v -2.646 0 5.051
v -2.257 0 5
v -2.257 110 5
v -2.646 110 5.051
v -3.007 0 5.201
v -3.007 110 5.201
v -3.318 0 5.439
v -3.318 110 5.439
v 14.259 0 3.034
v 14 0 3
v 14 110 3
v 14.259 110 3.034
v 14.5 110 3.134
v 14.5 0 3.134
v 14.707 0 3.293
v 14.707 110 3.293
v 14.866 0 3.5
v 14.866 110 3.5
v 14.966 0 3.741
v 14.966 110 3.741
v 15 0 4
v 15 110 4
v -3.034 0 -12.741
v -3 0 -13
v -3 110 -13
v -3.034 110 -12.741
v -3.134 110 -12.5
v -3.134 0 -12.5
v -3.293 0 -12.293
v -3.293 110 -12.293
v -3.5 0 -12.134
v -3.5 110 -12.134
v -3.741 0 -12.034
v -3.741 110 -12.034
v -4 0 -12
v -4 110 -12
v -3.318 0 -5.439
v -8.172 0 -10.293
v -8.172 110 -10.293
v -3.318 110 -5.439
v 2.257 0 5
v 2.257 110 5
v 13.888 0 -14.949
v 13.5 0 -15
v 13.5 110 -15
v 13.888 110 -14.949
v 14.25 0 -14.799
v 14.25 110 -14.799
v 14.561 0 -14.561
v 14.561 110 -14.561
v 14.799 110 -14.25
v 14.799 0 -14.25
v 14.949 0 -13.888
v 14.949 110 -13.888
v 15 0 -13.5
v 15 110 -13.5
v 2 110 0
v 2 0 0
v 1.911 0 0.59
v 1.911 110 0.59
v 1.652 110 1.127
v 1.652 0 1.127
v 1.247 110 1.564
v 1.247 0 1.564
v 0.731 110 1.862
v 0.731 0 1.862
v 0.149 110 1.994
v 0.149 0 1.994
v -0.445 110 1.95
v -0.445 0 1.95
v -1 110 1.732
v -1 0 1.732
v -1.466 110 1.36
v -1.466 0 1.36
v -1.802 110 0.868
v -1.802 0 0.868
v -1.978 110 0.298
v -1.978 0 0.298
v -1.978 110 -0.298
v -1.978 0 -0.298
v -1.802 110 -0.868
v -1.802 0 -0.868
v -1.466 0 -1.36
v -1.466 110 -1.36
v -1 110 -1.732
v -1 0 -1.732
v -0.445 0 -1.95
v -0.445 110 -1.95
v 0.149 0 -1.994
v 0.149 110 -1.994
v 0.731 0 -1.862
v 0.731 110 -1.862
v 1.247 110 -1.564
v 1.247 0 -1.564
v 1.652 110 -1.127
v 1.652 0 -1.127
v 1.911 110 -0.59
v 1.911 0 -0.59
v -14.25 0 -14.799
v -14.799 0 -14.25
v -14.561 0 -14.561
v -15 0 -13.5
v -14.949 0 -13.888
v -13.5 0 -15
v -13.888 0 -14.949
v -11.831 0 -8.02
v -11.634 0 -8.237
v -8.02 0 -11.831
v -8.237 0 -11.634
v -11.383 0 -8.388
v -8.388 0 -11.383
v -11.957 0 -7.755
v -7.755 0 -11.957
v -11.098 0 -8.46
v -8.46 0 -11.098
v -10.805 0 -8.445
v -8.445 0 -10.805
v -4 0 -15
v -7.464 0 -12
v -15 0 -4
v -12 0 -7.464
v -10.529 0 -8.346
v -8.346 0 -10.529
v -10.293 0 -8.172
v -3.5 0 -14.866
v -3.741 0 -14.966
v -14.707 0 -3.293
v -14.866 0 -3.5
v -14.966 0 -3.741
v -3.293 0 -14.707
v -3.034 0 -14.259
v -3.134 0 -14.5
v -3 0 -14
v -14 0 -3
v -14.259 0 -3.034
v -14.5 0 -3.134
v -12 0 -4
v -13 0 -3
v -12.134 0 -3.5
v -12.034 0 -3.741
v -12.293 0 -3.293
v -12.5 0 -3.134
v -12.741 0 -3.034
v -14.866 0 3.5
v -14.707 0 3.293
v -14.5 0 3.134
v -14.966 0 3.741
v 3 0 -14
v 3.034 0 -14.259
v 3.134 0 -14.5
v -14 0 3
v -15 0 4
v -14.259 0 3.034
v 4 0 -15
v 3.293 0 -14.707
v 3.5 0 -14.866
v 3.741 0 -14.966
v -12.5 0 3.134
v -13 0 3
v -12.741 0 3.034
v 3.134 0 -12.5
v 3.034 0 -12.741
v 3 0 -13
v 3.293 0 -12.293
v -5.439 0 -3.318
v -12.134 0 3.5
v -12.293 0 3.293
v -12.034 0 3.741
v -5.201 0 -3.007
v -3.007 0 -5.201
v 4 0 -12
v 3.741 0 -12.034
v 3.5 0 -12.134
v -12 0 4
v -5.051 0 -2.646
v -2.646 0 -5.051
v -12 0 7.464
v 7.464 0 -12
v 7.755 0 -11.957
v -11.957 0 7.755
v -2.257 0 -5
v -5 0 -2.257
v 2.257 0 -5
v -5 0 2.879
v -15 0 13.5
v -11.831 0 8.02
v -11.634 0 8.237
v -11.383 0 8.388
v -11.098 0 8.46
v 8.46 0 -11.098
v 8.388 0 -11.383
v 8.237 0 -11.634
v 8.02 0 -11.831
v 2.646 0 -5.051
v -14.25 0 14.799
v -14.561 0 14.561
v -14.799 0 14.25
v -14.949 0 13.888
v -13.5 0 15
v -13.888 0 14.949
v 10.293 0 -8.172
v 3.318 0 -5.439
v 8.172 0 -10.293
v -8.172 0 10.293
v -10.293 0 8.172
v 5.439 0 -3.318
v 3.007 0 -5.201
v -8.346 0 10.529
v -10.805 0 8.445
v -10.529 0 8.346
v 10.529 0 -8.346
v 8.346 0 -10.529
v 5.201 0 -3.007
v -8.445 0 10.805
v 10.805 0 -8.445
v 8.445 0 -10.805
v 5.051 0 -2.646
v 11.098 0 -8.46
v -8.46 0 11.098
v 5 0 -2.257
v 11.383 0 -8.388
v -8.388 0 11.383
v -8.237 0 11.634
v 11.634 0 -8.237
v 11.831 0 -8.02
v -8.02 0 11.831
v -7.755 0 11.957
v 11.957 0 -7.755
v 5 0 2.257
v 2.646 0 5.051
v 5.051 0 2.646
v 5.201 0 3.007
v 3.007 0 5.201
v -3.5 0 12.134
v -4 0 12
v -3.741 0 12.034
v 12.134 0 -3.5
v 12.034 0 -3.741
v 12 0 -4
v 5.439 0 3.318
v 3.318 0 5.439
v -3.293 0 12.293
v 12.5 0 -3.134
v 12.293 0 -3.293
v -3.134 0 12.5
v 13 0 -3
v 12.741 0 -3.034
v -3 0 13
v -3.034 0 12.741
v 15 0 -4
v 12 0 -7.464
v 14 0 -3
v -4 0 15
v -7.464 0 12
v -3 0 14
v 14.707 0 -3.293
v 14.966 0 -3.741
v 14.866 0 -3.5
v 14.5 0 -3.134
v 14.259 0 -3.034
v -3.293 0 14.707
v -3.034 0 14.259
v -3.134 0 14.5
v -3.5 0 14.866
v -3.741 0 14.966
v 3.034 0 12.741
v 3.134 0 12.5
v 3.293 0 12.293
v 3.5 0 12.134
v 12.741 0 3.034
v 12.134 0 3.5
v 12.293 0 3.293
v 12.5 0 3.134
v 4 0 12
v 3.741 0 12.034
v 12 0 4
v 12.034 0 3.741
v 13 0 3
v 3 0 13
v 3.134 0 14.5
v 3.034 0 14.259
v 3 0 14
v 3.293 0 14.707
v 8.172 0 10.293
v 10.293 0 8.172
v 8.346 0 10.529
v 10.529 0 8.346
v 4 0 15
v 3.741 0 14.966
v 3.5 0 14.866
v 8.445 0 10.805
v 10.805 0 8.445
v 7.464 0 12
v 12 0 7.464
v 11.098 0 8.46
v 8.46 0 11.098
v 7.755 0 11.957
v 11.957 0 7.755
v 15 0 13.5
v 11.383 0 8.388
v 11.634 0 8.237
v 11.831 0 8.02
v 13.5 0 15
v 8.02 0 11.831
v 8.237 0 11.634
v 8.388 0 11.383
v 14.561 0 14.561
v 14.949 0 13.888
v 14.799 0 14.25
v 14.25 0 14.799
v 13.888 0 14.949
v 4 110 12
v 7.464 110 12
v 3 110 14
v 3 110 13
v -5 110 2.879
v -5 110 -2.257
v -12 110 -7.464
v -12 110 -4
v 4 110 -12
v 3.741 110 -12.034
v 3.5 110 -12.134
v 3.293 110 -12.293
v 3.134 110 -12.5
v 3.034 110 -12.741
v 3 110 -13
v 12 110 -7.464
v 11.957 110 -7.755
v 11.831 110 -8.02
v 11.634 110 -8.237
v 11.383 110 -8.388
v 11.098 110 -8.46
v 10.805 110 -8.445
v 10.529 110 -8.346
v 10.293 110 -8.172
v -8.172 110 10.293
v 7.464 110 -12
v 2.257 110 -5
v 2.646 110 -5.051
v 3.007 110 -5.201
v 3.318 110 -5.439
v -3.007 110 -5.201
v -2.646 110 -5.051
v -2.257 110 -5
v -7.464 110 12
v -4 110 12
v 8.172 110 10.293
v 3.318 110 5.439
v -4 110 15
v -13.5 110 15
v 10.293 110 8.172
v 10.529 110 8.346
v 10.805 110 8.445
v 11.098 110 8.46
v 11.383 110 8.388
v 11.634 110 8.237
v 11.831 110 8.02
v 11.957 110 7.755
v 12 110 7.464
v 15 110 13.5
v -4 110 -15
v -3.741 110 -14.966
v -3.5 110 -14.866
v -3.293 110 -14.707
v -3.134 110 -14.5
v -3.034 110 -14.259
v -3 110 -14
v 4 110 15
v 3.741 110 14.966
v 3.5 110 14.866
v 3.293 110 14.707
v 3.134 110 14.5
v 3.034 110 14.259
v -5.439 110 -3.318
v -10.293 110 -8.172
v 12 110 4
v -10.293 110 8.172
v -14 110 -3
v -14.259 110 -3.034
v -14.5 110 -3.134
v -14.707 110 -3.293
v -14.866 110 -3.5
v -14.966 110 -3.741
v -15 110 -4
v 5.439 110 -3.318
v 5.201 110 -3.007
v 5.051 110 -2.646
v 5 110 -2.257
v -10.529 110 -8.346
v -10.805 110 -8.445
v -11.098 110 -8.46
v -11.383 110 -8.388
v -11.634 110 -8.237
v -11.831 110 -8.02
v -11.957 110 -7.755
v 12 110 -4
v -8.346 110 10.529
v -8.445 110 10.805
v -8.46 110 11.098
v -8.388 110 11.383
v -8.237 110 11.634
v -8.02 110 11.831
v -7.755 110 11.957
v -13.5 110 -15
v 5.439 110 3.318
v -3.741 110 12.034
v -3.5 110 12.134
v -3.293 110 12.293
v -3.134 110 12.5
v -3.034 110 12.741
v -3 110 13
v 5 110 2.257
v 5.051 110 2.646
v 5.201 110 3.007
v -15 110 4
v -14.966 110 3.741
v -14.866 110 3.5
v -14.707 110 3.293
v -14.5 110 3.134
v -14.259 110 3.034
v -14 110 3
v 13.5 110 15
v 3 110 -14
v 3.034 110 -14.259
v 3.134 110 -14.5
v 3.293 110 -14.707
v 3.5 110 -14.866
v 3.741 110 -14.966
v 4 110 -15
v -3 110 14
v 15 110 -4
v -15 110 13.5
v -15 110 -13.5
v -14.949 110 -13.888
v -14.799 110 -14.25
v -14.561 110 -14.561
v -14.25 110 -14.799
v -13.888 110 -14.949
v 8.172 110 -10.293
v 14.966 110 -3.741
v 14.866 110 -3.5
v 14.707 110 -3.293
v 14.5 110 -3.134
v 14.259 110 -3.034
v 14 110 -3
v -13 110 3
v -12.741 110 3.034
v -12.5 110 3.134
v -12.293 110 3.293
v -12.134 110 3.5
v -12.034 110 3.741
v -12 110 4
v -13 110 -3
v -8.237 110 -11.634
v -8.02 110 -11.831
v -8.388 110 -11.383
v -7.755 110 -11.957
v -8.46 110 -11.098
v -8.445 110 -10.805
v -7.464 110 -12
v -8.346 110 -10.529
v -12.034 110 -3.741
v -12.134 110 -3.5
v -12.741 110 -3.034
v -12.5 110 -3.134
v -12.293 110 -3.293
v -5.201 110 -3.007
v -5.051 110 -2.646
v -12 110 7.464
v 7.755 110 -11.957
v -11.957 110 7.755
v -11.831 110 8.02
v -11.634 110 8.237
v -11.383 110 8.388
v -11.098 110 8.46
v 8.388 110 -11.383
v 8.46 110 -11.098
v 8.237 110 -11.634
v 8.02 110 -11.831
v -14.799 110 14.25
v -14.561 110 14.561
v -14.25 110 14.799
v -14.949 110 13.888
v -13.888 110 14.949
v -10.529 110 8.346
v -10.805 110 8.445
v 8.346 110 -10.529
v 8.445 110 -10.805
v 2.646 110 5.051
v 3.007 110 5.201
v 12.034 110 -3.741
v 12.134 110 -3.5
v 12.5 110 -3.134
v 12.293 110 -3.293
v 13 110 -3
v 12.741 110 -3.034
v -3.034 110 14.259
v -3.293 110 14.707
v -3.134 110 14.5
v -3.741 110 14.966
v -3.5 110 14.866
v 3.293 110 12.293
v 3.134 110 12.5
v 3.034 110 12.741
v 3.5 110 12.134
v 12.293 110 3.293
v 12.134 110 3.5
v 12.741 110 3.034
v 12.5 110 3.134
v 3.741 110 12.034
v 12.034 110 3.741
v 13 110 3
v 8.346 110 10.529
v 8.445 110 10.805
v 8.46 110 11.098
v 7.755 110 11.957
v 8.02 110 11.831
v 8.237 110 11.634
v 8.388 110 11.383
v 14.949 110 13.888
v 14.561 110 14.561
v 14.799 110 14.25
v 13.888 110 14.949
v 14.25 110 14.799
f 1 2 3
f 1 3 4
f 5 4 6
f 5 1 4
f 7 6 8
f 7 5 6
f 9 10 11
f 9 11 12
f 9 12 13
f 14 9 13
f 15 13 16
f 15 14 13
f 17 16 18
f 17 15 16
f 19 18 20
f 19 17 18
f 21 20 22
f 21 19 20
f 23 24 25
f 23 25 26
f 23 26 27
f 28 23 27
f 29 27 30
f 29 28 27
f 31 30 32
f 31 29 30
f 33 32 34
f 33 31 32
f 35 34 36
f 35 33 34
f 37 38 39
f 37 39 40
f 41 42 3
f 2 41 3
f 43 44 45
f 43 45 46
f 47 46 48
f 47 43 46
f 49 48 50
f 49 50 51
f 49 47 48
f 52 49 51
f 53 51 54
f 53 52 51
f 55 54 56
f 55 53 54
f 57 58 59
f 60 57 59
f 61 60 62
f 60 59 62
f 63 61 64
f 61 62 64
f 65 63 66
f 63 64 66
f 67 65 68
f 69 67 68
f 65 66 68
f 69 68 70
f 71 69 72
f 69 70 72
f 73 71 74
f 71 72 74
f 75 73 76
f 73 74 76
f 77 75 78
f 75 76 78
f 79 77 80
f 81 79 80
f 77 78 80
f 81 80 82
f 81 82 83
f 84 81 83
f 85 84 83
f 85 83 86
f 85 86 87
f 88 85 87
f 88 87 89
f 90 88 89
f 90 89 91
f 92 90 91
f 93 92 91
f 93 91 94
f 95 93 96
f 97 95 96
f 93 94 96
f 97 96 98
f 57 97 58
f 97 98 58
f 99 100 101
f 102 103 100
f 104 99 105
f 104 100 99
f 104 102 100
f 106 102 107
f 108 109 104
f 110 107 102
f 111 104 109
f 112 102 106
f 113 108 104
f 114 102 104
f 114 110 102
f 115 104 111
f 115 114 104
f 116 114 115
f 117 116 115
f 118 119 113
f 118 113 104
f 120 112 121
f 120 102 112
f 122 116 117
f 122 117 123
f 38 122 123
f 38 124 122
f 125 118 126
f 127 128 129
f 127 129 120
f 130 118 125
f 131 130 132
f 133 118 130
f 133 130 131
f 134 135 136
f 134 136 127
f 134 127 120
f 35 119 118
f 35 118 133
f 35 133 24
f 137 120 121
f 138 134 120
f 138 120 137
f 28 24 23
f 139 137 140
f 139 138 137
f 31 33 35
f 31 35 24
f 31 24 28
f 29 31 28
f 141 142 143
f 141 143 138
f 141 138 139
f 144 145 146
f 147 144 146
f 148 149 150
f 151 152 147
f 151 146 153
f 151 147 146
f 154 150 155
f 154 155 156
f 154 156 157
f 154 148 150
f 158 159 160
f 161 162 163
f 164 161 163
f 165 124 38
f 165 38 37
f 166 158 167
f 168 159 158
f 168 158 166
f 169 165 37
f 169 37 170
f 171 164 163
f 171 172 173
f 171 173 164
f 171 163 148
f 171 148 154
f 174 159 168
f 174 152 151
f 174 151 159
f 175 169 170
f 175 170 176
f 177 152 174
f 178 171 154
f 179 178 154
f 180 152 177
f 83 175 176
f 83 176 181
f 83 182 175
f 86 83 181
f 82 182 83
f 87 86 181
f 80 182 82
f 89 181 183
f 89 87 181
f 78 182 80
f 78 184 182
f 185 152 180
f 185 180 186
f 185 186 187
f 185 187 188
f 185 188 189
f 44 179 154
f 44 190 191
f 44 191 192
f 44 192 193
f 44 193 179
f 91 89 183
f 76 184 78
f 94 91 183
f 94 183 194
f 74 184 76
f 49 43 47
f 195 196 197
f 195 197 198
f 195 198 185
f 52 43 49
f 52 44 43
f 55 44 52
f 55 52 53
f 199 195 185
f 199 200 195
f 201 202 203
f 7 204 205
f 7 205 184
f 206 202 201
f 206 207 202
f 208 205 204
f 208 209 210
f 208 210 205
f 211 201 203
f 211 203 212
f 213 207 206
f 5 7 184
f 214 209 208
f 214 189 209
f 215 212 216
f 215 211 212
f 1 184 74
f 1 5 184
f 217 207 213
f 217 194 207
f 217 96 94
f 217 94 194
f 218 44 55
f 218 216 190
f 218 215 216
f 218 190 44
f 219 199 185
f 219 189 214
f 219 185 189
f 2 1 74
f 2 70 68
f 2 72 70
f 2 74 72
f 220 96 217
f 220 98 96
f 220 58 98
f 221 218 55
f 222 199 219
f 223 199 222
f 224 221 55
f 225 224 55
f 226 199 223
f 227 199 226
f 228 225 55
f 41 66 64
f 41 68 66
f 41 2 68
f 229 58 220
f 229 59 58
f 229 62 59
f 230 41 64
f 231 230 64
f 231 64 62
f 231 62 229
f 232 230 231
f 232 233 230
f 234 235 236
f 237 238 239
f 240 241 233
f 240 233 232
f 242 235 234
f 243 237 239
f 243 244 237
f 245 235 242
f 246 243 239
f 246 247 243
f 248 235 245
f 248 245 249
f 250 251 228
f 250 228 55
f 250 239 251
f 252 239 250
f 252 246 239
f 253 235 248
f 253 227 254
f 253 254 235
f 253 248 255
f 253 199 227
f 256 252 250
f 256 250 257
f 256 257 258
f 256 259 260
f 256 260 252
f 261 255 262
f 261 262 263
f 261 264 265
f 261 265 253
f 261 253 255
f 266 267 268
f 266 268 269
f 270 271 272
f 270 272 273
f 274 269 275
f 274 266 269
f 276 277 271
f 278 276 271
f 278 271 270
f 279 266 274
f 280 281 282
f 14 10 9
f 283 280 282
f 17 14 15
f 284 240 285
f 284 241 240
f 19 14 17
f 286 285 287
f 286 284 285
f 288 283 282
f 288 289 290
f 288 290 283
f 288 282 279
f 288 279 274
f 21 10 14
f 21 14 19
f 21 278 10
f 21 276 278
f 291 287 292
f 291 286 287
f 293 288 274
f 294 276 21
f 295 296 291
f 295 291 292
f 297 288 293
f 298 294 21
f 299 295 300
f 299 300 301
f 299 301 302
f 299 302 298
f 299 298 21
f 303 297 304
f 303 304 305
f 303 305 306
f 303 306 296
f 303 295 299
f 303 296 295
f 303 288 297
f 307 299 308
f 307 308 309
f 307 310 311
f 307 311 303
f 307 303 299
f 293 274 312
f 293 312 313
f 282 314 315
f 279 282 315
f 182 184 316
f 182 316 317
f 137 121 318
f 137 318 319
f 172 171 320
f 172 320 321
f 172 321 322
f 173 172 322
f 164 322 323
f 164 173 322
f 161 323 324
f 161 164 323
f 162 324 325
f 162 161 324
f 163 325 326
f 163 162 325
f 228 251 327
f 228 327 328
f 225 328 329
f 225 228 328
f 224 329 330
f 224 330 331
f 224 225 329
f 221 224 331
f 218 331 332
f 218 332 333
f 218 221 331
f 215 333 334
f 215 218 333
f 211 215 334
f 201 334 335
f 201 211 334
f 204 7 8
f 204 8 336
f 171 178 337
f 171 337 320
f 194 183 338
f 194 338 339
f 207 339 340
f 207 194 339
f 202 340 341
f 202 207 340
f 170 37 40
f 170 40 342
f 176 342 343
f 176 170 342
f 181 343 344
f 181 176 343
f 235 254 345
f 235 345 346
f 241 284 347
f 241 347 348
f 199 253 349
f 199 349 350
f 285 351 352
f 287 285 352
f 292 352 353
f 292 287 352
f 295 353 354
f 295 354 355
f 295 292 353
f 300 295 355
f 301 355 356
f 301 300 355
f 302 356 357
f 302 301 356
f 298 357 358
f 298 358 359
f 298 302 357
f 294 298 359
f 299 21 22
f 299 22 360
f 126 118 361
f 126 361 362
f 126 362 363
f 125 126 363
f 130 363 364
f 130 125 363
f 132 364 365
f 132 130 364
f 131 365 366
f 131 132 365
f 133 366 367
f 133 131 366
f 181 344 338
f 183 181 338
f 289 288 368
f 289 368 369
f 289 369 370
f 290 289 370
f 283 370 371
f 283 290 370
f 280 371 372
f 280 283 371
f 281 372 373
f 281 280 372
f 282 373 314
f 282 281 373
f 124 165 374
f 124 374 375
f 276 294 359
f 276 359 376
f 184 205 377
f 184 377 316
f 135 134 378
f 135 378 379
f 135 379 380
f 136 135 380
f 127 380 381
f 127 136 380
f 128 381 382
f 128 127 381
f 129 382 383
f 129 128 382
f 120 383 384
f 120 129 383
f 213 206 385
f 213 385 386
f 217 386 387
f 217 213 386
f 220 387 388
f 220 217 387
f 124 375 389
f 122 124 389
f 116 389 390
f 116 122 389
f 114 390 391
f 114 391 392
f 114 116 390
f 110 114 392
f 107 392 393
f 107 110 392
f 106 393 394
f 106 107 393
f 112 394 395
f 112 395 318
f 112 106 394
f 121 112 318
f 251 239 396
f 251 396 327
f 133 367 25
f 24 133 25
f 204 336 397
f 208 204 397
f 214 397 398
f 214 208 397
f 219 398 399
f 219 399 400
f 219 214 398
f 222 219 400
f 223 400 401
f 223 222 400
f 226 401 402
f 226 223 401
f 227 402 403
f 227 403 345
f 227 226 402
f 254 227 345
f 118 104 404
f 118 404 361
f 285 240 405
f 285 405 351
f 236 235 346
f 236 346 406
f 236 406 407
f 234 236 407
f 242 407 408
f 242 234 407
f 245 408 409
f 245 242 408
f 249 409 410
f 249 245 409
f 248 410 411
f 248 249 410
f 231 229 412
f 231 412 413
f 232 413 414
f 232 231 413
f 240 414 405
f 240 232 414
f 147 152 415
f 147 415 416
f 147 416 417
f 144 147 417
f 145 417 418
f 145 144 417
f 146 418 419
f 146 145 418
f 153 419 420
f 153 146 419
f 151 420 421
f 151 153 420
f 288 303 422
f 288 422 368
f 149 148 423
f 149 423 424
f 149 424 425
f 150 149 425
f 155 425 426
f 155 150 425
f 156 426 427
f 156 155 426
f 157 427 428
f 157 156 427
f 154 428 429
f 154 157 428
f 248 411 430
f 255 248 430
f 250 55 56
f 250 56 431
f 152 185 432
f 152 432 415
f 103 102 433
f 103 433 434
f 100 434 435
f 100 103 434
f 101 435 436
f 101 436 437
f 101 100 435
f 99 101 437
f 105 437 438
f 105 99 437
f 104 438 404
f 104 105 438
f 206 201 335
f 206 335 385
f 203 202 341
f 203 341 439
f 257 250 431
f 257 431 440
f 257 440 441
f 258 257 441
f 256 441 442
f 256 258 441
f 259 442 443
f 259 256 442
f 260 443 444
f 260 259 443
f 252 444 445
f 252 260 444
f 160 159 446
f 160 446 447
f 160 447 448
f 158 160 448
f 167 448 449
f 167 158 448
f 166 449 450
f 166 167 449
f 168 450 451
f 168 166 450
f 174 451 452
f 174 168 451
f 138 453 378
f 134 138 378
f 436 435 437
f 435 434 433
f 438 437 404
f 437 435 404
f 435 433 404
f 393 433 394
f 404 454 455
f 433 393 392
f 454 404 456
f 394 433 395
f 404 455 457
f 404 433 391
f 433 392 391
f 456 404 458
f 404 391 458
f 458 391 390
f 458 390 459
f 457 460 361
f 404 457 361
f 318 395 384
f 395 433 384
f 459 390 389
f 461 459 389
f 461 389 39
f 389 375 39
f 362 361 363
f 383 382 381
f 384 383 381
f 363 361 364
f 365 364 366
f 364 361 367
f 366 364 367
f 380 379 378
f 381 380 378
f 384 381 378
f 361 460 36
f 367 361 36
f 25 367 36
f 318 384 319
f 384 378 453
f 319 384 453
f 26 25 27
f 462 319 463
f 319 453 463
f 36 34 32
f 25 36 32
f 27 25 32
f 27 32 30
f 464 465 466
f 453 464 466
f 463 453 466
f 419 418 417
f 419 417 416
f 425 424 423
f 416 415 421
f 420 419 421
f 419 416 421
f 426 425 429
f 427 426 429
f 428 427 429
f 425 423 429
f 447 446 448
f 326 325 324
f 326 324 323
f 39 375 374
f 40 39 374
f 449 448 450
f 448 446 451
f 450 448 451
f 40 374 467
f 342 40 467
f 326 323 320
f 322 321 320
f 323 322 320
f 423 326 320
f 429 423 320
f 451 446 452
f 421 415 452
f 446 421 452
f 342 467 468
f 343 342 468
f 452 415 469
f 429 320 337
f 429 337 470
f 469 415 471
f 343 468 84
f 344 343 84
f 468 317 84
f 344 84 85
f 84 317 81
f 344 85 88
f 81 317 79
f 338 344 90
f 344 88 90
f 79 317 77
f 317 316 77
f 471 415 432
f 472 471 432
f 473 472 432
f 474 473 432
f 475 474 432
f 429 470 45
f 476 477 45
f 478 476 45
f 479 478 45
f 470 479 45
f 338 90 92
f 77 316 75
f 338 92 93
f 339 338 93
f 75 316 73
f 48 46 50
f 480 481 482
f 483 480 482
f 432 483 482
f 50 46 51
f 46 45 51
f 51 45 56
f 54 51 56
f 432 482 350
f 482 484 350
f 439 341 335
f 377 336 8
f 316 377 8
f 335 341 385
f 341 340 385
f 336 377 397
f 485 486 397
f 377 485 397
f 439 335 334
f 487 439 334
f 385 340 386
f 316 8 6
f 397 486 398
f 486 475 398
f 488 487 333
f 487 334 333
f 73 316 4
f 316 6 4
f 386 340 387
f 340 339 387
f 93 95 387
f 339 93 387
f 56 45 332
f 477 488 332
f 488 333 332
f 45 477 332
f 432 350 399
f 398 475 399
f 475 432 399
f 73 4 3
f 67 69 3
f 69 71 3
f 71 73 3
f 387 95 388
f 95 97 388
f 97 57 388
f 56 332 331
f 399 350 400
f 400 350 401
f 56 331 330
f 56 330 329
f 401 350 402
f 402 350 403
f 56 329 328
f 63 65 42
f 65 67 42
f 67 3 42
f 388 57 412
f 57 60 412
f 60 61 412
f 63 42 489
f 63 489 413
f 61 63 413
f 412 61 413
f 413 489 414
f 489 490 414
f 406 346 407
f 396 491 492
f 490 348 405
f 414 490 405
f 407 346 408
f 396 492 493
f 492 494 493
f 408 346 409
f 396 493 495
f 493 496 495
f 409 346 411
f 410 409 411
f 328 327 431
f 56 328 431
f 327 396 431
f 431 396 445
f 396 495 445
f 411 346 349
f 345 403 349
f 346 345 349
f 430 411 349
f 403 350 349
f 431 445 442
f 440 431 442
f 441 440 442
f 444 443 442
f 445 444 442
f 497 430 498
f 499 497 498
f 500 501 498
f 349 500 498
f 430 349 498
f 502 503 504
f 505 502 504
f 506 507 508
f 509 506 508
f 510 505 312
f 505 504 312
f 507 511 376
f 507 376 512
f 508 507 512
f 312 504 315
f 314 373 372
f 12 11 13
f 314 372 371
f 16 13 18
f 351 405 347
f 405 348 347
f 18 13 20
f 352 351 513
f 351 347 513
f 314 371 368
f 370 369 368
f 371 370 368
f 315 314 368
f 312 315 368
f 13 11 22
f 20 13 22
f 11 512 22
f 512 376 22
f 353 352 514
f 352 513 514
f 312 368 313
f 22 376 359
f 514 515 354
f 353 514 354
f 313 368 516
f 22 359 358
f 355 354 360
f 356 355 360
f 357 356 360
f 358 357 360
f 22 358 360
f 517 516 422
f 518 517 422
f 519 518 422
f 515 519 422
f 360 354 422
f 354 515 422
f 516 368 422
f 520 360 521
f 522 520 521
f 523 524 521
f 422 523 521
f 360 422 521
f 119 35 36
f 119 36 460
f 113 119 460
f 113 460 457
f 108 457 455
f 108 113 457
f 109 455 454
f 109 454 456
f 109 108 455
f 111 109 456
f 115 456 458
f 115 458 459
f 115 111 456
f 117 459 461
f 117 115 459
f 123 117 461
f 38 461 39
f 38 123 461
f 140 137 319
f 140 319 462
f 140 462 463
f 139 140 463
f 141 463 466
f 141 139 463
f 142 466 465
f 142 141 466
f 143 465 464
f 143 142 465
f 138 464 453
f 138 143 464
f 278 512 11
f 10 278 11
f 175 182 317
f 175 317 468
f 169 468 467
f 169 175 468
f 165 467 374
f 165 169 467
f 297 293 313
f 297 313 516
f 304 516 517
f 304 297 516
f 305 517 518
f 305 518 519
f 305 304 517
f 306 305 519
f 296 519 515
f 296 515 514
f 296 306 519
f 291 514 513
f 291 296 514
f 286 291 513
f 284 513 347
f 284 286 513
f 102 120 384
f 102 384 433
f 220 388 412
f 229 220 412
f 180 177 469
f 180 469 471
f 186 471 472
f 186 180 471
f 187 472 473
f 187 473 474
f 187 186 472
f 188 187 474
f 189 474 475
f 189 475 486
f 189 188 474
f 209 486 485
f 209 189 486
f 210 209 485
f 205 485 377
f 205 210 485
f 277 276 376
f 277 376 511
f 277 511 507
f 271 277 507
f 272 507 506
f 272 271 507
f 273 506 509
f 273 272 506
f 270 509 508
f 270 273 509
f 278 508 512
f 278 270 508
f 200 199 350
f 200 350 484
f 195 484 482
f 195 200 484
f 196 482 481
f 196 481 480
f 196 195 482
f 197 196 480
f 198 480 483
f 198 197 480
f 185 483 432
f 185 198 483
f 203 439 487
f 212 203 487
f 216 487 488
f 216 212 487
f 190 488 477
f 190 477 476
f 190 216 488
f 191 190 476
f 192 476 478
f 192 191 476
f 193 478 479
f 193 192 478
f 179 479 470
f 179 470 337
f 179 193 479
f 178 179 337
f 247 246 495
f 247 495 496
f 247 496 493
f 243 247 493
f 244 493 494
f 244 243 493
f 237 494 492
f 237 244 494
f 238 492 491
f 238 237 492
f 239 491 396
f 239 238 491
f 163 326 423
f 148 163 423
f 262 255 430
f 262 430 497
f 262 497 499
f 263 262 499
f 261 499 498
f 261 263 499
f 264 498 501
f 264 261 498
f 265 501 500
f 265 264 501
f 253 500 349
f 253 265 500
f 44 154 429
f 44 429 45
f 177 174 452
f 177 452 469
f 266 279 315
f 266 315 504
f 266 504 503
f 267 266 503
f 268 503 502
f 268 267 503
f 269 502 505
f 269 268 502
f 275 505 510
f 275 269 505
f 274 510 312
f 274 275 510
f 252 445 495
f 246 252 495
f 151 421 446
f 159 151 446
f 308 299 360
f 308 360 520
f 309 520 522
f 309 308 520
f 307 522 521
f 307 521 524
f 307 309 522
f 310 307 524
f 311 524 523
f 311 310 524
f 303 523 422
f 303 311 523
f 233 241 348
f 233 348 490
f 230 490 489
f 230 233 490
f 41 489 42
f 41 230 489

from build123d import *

# Parameters (mm, degrees)
F0_R     = 2
F1_DEPTH = 110


with BuildPart() as f1:
    # F0 (on Front) → F1 (new body)
    with BuildSketch(Plane.XZ):
        with BuildLine():
            ThreePointArc((15, 13.5), (14.56066, 14.56066), (13.5, 15))
            Line((13.5, 15), (4, 15))
            ThreePointArc((4, 15), (3.292893, 14.707107), (3, 14))
            Line((3, 14), (3, 13))
            ThreePointArc((3, 13), (3.292893, 12.292893), (4, 12))
            Line((4, 12), (7.464466, 12))
            ThreePointArc((7.464466, 12), (8.388346, 11.382683), (8.171573, 10.292893))
            Line((8.171573, 10.292893), (3.318019, 5.43934))
            ThreePointArc((3.318019, 5.43934), (2.831384, 5.114181), (2.257359, 5))
            Line((2.257359, 5), (-2.257359, 5))
            ThreePointArc((-2.257359, 5), (-2.831384, 5.114181), (-3.318019, 5.43934))
            Line((-3.318019, 5.43934), (-8.171573, 10.292893))
            ThreePointArc((-8.171573, 10.292893), (-8.388346, 11.382683), (-7.464466, 12))
            Line((-7.464466, 12), (-4, 12))
            ThreePointArc((-4, 12), (-3.292893, 12.292893), (-3, 13))
            Line((-3, 13), (-3, 14))
            ThreePointArc((-3, 14), (-3.292893, 14.707107), (-4, 15))
            Line((-4, 15), (-13.5, 15))
            ThreePointArc((-13.5, 15), (-14.56066, 14.56066), (-15, 13.5))
            Line((-15, 13.5), (-15, 4))
            ThreePointArc((-15, 4), (-14.707107, 3.292893), (-14, 3))
            Line((-14, 3), (-13, 3))
            ThreePointArc((-13, 3), (-12.292893, 3.292893), (-12, 4))
            Line((-12, 4), (-12, 7.464466))
            ThreePointArc((-12, 7.464466), (-11.382683, 8.388346), (-10.292893, 8.171573))
            Line((-10.292893, 8.171573), (-5, 2.87868))
            Line((-5, 2.87868), (-5, -2.257359))
            ThreePointArc((-5, -2.257359), (-5.114181, -2.831384), (-5.43934, -3.318019))
            Line((-5.43934, -3.318019), (-10.292893, -8.171573))
            ThreePointArc((-10.292893, -8.171573), (-11.382683, -8.388346), (-12, -7.464466))
            Line((-12, -7.464466), (-12, -4))
            ThreePointArc((-12, -4), (-12.292893, -3.292893), (-13, -3))
            Line((-13, -3), (-14, -3))
            ThreePointArc((-14, -3), (-14.707107, -3.292893), (-15, -4))
            Line((-15, -4), (-15, -13.5))
            ThreePointArc((-15, -13.5), (-14.56066, -14.56066), (-13.5, -15))
            Line((-13.5, -15), (-4, -15))
            ThreePointArc((-4, -15), (-3.292893, -14.707107), (-3, -14))
            Line((-3, -14), (-3, -13))
            ThreePointArc((-3, -13), (-3.292893, -12.292893), (-4, -12))
            Line((-4, -12), (-7.464466, -12))
            ThreePointArc((-7.464466, -12), (-8.388346, -11.382683), (-8.171573, -10.292893))
            Line((-8.171573, -10.292893), (-3.318019, -5.43934))
            ThreePointArc((-3.318019, -5.43934), (-2.831384, -5.114181), (-2.257359, -5))
            Line((-2.257359, -5), (2.257359, -5))
            ThreePointArc((2.257359, -5), (2.831384, -5.114181), (3.318019, -5.43934))
            Line((3.318019, -5.43934), (8.171573, -10.292893))
            ThreePointArc((8.171573, -10.292893), (8.388346, -11.382683), (7.464466, -12))
            Line((7.464466, -12), (4, -12))
            ThreePointArc((4, -12), (3.292893, -12.292893), (3, -13))
            Line((3, -13), (3, -14))
            ThreePointArc((3, -14), (3.292893, -14.707107), (4, -15))
            Line((4, -15), (13.5, -15))
            ThreePointArc((13.5, -15), (14.56066, -14.56066), (15, -13.5))
            Line((15, -13.5), (15, -4))
            ThreePointArc((15, -4), (14.707107, -3.292893), (14, -3))
            Line((14, -3), (13, -3))
            ThreePointArc((13, -3), (12.292893, -3.292893), (12, -4))
            Line((12, -4), (12, -7.464466))
            ThreePointArc((12, -7.464466), (11.382683, -8.388346), (10.292893, -8.171573))
            Line((10.292893, -8.171573), (5.43934, -3.318019))
            ThreePointArc((5.43934, -3.318019), (5.114181, -2.831384), (5, -2.257359))
            Line((5, -2.257359), (5, 2.257359))
            ThreePointArc((5, 2.257359), (5.114181, 2.831384), (5.43934, 3.318019))
            Line((5.43934, 3.318019), (10.292893, 8.171573))
            ThreePointArc((10.292893, 8.171573), (11.382683, 8.388346), (12, 7.464466))
            Line((12, 7.464466), (12, 4))
            ThreePointArc((12, 4), (12.292893, 3.292893), (13, 3))
            Line((13, 3), (14, 3))
            ThreePointArc((14, 3), (14.707107, 3.292893), (15, 4))
            Line((15, 4), (15, 13.5))
        make_face()
        Circle(F0_R, mode=Mode.SUBTRACT)
    extrude(amount=-F1_DEPTH)


solid = f1.part
